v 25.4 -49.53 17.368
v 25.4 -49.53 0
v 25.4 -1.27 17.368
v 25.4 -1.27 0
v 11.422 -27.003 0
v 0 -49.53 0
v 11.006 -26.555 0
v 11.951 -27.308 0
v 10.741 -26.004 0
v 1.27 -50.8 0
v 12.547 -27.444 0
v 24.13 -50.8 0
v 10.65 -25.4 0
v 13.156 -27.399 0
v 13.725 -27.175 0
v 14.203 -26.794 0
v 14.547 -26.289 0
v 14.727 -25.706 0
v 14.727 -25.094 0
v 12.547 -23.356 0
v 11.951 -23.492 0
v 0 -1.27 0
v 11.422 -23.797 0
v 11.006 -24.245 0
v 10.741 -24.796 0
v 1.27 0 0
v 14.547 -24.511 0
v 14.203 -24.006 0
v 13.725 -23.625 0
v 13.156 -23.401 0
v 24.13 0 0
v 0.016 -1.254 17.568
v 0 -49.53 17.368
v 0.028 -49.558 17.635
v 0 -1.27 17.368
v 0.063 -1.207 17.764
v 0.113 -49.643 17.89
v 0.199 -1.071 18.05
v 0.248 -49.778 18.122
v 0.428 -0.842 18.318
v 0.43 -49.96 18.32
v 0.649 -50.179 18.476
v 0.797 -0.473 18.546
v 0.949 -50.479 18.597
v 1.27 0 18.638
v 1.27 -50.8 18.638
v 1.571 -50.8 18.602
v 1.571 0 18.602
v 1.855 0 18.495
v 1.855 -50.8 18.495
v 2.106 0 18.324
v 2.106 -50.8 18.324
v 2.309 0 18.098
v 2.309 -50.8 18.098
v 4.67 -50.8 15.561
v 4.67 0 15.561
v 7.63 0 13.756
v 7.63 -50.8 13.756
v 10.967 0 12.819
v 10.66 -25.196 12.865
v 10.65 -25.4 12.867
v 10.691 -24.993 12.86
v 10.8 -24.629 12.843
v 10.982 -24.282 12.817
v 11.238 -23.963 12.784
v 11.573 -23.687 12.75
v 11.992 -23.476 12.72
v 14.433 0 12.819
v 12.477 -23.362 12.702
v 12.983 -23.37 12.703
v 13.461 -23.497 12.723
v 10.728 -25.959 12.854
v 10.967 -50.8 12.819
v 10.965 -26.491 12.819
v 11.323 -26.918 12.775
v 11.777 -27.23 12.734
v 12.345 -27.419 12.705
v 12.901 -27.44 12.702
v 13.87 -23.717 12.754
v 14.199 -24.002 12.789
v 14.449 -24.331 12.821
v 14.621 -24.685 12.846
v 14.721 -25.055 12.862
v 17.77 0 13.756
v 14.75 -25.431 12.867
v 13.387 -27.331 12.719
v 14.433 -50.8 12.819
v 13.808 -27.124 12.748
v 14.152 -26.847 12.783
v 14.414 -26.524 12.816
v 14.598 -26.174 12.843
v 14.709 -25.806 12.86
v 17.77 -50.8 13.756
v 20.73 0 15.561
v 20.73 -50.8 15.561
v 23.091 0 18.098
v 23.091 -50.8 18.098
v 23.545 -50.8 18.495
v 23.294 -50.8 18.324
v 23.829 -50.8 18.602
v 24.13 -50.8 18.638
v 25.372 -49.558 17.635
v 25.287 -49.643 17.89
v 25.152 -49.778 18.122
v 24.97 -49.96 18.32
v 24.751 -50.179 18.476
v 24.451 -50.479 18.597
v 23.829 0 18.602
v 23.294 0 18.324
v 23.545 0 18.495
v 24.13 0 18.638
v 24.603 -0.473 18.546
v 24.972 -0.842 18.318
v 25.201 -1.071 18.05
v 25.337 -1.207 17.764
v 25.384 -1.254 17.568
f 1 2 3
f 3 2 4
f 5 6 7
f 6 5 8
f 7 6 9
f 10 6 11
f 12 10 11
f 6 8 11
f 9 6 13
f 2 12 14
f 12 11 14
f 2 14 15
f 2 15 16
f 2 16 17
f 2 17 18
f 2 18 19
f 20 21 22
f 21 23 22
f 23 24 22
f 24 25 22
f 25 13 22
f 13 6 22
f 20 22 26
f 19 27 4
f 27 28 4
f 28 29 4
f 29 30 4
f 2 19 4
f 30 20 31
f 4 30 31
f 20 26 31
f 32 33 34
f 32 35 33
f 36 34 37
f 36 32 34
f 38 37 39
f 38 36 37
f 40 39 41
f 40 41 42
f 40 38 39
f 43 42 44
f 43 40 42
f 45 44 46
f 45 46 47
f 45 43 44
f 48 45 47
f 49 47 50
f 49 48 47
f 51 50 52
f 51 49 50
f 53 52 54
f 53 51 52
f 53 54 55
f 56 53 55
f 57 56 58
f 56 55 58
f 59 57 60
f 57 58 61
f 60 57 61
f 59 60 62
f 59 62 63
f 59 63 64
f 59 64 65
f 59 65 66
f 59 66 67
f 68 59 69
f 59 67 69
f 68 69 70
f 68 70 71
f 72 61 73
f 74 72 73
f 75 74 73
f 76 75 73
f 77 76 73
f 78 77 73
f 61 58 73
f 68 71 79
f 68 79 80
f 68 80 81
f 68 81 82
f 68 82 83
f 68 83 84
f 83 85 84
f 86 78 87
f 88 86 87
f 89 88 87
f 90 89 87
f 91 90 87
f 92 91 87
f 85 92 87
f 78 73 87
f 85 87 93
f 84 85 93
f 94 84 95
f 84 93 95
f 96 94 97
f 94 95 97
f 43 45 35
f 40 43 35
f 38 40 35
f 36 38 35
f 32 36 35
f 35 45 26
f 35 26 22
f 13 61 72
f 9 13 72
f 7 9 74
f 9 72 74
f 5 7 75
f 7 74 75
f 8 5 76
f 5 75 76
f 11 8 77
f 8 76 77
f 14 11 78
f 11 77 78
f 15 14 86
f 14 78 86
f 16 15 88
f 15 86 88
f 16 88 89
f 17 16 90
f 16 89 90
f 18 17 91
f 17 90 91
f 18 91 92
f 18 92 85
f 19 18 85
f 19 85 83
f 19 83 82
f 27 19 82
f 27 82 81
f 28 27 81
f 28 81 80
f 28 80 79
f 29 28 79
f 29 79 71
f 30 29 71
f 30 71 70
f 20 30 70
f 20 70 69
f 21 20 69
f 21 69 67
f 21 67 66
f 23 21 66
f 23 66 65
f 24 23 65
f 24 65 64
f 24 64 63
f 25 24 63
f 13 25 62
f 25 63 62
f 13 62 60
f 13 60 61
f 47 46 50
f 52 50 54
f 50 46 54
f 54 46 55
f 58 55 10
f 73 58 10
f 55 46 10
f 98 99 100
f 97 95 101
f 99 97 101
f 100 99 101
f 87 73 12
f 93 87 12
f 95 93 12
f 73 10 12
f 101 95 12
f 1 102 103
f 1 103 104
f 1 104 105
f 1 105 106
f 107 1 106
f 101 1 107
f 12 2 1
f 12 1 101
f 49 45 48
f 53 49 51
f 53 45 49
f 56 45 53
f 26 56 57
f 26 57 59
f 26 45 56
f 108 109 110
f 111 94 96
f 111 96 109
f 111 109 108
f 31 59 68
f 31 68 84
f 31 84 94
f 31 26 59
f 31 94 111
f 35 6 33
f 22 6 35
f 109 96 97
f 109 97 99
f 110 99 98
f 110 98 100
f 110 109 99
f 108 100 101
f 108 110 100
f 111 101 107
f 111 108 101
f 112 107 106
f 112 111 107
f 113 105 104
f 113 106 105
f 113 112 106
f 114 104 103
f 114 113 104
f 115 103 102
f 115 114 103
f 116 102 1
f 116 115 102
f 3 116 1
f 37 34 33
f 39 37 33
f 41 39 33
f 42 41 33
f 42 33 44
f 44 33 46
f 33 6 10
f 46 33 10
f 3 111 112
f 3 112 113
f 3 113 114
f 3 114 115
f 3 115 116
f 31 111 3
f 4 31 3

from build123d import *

# Parameters (mm, degrees)
F0_W        = 25.4
F0_H        = 50.8
F1_DEPTH    = 25.4
F3_DEPTH    = 50.8
F5_D        = 4.1
F6_F1_R     = 1.27
F6_F2_R     = 1.27
F7_T1_DEPTH = 23.8998895326


# Not quite as in the source:
# - a fillet or chamfer that OpenCascade refuses, or shapes differently, is made with other operations: its cross-section is extruded or revolved along the edge and cut away or added


with BuildPart() as f1:
    # F0 (on Top) → F1 (new body)
    with BuildSketch(Plane.XY):
        with Locations((12.7, -25.4)):
            Rectangle(F0_W, F0_H)
    extrude(amount=F1_DEPTH)

    # F2 (on face) → F3 (cut)
    with BuildSketch(Plane.XZ.offset(50.8)):
        with BuildLine():
            ThreePointArc((0, 25.4), (12.7, 12.7), (25.4, 25.4))
            Line((25.4, 25.4), (0, 25.4))
        make_face()
    extrude(amount=-F3_DEPTH, mode=Mode.SUBTRACT)

    # F5 (through all)
    with Locations(Plane(origin=(0, 0, 0), x_dir=(1, 0, 0), z_dir=(0, 0, -1))):
        with Locations((12.7, 25.4)):
            Hole(F5_D / 2)

    # F6: fillet of radius 1.27 on 2 edges, made by hand

    # F6_f1
    f6_f1_edges = [f1.edges().sort_by_distance(p)[0] for p in [
        (0, -25.4, 25.4),
    ]]
    fillet(f6_f1_edges, radius=F6_F1_R)

    # F6_f2
    f6_f2_edges = [f1.edges().sort_by_distance(p)[0] for p in [
        (25.4, -25.4, 25.4),
    ]]
    fillet(f6_f2_edges, radius=F6_F2_R)

    # F7: chamfer of 1.27 on 4 edges, made by hand

    # F7_s2 → F7_t1 (cut)
    with BuildSketch(Plane.XY.offset(-3.2660373947)):
        Polygon((25.4, -49.53), (24.13, -50.8), (25.4, -50.8), align=None)
        Polygon((0, -49.53), (1.27, -50.8), (0, -50.8), align=None)
        Polygon((24.13, 0), (25.4, -1.27), (25.4, 0), align=None)
        Polygon((1.27, 0), (0, -1.27), (0, 0), align=None)
    extrude(amount=F7_T1_DEPTH, mode=Mode.SUBTRACT)


solid = f1.part
